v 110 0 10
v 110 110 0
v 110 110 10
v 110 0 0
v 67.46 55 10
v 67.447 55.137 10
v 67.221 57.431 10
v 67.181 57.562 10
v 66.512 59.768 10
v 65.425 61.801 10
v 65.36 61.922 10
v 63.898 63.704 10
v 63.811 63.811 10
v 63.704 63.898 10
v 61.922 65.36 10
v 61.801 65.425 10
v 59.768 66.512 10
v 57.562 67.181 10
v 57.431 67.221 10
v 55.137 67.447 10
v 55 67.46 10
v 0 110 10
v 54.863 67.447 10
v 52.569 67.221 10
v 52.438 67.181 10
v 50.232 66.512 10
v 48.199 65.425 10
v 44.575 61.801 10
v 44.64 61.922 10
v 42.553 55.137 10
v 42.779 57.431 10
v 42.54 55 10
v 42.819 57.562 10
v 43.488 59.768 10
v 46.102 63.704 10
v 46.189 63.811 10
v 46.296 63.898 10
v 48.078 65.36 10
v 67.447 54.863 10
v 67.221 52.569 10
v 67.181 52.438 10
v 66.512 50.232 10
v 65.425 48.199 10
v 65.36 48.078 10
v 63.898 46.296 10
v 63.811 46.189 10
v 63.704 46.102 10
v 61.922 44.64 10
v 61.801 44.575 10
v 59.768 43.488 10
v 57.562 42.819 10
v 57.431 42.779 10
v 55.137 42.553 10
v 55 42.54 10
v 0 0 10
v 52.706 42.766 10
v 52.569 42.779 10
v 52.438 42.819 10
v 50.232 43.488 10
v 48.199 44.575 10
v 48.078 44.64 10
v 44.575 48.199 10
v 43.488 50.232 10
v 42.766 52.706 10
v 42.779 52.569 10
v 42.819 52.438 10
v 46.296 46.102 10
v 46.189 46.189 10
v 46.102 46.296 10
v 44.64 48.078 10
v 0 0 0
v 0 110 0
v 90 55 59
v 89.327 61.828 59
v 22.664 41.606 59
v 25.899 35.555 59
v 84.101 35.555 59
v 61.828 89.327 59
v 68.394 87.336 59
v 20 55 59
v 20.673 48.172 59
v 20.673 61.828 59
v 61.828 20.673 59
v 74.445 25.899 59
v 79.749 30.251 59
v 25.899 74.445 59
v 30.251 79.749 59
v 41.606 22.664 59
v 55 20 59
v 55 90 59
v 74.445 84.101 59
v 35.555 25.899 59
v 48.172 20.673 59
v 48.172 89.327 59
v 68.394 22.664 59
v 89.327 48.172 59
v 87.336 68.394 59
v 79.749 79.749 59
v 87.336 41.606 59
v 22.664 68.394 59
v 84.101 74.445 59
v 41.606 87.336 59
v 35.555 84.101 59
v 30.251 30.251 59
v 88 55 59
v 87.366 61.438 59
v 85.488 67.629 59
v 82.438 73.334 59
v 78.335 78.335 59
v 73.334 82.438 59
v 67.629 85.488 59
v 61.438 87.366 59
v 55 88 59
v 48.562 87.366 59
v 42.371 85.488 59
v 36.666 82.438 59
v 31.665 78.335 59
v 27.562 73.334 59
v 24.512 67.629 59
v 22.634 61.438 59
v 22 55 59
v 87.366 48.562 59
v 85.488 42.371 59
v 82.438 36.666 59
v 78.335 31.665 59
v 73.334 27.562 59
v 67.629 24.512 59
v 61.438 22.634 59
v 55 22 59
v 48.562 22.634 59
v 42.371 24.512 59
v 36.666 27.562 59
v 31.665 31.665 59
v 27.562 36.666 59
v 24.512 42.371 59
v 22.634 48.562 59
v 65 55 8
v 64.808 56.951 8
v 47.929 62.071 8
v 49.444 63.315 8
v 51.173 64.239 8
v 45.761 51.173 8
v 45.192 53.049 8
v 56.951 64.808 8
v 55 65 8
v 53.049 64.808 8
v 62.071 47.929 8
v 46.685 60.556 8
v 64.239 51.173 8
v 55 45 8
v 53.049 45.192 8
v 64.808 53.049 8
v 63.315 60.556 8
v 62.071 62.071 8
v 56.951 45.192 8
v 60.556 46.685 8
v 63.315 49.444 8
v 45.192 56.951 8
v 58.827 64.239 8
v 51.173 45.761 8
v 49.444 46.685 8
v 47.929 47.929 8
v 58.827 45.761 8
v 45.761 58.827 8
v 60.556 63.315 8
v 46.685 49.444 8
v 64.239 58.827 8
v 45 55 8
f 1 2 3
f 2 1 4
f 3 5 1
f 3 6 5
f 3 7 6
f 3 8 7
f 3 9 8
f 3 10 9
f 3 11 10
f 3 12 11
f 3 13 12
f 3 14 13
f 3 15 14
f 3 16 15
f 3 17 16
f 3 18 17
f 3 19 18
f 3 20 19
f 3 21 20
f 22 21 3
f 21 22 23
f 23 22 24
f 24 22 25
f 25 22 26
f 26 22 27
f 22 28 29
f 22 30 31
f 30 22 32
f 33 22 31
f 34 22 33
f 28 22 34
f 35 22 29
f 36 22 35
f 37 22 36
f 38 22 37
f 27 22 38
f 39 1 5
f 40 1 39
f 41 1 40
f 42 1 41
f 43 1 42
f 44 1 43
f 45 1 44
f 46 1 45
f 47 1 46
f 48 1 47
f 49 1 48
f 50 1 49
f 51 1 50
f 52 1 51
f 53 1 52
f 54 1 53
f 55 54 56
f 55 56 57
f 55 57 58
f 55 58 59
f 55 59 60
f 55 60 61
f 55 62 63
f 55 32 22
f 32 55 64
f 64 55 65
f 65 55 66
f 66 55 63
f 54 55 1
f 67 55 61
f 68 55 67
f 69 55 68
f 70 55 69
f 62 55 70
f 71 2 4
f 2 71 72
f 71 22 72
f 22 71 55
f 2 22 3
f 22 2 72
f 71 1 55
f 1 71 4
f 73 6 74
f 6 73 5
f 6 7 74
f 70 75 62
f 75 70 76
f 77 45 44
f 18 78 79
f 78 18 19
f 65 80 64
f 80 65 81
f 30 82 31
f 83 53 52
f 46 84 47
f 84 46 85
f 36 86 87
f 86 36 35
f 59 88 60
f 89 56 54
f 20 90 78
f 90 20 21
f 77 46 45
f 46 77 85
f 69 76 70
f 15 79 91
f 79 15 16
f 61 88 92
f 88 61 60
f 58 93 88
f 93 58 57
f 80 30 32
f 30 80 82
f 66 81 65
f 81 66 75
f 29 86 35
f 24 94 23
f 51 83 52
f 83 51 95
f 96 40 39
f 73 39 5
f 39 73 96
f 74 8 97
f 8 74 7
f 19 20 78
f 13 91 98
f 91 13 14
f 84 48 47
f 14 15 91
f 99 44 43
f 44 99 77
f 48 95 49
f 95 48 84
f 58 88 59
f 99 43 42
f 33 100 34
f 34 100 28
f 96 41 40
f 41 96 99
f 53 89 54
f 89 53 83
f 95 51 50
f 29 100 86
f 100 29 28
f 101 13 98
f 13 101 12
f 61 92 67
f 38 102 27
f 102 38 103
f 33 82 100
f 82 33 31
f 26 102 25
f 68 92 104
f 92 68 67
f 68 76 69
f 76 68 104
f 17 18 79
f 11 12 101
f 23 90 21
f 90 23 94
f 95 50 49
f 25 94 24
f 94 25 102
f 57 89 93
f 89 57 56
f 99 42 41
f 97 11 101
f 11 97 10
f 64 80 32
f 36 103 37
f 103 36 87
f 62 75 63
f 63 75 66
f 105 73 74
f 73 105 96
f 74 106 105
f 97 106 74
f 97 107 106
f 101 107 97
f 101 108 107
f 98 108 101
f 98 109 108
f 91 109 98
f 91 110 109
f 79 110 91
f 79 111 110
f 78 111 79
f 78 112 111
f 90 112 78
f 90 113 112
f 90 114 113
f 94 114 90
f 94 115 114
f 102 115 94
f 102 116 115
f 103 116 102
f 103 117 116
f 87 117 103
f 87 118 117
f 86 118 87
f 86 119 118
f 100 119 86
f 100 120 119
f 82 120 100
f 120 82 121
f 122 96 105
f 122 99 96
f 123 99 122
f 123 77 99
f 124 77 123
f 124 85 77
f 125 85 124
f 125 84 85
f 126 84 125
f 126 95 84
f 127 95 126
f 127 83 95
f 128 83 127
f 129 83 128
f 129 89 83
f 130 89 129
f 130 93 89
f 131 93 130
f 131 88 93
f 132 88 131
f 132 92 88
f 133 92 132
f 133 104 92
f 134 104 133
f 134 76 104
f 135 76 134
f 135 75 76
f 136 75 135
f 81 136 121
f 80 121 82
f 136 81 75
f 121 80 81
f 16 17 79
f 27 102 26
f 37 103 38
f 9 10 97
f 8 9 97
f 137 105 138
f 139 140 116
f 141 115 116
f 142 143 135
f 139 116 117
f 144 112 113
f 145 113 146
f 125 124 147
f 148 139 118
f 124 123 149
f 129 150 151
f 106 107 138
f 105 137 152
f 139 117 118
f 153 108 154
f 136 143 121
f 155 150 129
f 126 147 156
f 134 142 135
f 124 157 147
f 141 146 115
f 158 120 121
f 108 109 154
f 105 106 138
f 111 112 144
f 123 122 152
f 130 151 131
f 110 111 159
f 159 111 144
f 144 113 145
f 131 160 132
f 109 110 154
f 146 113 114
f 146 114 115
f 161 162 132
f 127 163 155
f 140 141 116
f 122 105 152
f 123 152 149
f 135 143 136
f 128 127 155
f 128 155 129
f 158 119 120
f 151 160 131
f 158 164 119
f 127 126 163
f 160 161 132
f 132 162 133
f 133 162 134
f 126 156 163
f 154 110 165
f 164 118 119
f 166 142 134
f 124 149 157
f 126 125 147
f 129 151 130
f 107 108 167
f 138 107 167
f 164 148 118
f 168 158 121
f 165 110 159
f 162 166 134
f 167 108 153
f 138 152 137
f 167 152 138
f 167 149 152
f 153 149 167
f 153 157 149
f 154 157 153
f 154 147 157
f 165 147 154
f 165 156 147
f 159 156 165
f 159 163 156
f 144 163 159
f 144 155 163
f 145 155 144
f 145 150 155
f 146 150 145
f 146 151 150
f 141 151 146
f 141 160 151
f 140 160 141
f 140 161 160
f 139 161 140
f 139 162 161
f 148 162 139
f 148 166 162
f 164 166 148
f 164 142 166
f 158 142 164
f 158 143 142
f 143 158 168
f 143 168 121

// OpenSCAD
$fn = 32;

// ----------------------------------------------------------------------
// Hopper: funnel with square flange
// ----------------------------------------------------------------------

// --- parameters (mm) ---
fl = 110;                 // flange side, X and Y
fl_t = 10;                // flange thickness
cone_h = 50;              // cone height above the flange
top_d = 70;               // cone mouth diameter
bot_d = 24;               // cone spout diameter
wall = 2;                 // cone wall thickness

bore_d = bot_d - 2 * wall;  // spout bore diameter
total_h = fl_t + cone_h - 1;  // overall height

difference() {
  union() {
    cube([fl, fl, fl_t]);
    translate([fl / 2, fl / 2, fl_t - 1])
      cylinder(h = cone_h, d1 = bot_d, d2 = top_d);
  }
  translate([fl / 2, fl / 2, fl_t - 2])
    cylinder(h = cone_h + 1, d1 = bore_d, d2 = top_d - 2 * wall);
}
